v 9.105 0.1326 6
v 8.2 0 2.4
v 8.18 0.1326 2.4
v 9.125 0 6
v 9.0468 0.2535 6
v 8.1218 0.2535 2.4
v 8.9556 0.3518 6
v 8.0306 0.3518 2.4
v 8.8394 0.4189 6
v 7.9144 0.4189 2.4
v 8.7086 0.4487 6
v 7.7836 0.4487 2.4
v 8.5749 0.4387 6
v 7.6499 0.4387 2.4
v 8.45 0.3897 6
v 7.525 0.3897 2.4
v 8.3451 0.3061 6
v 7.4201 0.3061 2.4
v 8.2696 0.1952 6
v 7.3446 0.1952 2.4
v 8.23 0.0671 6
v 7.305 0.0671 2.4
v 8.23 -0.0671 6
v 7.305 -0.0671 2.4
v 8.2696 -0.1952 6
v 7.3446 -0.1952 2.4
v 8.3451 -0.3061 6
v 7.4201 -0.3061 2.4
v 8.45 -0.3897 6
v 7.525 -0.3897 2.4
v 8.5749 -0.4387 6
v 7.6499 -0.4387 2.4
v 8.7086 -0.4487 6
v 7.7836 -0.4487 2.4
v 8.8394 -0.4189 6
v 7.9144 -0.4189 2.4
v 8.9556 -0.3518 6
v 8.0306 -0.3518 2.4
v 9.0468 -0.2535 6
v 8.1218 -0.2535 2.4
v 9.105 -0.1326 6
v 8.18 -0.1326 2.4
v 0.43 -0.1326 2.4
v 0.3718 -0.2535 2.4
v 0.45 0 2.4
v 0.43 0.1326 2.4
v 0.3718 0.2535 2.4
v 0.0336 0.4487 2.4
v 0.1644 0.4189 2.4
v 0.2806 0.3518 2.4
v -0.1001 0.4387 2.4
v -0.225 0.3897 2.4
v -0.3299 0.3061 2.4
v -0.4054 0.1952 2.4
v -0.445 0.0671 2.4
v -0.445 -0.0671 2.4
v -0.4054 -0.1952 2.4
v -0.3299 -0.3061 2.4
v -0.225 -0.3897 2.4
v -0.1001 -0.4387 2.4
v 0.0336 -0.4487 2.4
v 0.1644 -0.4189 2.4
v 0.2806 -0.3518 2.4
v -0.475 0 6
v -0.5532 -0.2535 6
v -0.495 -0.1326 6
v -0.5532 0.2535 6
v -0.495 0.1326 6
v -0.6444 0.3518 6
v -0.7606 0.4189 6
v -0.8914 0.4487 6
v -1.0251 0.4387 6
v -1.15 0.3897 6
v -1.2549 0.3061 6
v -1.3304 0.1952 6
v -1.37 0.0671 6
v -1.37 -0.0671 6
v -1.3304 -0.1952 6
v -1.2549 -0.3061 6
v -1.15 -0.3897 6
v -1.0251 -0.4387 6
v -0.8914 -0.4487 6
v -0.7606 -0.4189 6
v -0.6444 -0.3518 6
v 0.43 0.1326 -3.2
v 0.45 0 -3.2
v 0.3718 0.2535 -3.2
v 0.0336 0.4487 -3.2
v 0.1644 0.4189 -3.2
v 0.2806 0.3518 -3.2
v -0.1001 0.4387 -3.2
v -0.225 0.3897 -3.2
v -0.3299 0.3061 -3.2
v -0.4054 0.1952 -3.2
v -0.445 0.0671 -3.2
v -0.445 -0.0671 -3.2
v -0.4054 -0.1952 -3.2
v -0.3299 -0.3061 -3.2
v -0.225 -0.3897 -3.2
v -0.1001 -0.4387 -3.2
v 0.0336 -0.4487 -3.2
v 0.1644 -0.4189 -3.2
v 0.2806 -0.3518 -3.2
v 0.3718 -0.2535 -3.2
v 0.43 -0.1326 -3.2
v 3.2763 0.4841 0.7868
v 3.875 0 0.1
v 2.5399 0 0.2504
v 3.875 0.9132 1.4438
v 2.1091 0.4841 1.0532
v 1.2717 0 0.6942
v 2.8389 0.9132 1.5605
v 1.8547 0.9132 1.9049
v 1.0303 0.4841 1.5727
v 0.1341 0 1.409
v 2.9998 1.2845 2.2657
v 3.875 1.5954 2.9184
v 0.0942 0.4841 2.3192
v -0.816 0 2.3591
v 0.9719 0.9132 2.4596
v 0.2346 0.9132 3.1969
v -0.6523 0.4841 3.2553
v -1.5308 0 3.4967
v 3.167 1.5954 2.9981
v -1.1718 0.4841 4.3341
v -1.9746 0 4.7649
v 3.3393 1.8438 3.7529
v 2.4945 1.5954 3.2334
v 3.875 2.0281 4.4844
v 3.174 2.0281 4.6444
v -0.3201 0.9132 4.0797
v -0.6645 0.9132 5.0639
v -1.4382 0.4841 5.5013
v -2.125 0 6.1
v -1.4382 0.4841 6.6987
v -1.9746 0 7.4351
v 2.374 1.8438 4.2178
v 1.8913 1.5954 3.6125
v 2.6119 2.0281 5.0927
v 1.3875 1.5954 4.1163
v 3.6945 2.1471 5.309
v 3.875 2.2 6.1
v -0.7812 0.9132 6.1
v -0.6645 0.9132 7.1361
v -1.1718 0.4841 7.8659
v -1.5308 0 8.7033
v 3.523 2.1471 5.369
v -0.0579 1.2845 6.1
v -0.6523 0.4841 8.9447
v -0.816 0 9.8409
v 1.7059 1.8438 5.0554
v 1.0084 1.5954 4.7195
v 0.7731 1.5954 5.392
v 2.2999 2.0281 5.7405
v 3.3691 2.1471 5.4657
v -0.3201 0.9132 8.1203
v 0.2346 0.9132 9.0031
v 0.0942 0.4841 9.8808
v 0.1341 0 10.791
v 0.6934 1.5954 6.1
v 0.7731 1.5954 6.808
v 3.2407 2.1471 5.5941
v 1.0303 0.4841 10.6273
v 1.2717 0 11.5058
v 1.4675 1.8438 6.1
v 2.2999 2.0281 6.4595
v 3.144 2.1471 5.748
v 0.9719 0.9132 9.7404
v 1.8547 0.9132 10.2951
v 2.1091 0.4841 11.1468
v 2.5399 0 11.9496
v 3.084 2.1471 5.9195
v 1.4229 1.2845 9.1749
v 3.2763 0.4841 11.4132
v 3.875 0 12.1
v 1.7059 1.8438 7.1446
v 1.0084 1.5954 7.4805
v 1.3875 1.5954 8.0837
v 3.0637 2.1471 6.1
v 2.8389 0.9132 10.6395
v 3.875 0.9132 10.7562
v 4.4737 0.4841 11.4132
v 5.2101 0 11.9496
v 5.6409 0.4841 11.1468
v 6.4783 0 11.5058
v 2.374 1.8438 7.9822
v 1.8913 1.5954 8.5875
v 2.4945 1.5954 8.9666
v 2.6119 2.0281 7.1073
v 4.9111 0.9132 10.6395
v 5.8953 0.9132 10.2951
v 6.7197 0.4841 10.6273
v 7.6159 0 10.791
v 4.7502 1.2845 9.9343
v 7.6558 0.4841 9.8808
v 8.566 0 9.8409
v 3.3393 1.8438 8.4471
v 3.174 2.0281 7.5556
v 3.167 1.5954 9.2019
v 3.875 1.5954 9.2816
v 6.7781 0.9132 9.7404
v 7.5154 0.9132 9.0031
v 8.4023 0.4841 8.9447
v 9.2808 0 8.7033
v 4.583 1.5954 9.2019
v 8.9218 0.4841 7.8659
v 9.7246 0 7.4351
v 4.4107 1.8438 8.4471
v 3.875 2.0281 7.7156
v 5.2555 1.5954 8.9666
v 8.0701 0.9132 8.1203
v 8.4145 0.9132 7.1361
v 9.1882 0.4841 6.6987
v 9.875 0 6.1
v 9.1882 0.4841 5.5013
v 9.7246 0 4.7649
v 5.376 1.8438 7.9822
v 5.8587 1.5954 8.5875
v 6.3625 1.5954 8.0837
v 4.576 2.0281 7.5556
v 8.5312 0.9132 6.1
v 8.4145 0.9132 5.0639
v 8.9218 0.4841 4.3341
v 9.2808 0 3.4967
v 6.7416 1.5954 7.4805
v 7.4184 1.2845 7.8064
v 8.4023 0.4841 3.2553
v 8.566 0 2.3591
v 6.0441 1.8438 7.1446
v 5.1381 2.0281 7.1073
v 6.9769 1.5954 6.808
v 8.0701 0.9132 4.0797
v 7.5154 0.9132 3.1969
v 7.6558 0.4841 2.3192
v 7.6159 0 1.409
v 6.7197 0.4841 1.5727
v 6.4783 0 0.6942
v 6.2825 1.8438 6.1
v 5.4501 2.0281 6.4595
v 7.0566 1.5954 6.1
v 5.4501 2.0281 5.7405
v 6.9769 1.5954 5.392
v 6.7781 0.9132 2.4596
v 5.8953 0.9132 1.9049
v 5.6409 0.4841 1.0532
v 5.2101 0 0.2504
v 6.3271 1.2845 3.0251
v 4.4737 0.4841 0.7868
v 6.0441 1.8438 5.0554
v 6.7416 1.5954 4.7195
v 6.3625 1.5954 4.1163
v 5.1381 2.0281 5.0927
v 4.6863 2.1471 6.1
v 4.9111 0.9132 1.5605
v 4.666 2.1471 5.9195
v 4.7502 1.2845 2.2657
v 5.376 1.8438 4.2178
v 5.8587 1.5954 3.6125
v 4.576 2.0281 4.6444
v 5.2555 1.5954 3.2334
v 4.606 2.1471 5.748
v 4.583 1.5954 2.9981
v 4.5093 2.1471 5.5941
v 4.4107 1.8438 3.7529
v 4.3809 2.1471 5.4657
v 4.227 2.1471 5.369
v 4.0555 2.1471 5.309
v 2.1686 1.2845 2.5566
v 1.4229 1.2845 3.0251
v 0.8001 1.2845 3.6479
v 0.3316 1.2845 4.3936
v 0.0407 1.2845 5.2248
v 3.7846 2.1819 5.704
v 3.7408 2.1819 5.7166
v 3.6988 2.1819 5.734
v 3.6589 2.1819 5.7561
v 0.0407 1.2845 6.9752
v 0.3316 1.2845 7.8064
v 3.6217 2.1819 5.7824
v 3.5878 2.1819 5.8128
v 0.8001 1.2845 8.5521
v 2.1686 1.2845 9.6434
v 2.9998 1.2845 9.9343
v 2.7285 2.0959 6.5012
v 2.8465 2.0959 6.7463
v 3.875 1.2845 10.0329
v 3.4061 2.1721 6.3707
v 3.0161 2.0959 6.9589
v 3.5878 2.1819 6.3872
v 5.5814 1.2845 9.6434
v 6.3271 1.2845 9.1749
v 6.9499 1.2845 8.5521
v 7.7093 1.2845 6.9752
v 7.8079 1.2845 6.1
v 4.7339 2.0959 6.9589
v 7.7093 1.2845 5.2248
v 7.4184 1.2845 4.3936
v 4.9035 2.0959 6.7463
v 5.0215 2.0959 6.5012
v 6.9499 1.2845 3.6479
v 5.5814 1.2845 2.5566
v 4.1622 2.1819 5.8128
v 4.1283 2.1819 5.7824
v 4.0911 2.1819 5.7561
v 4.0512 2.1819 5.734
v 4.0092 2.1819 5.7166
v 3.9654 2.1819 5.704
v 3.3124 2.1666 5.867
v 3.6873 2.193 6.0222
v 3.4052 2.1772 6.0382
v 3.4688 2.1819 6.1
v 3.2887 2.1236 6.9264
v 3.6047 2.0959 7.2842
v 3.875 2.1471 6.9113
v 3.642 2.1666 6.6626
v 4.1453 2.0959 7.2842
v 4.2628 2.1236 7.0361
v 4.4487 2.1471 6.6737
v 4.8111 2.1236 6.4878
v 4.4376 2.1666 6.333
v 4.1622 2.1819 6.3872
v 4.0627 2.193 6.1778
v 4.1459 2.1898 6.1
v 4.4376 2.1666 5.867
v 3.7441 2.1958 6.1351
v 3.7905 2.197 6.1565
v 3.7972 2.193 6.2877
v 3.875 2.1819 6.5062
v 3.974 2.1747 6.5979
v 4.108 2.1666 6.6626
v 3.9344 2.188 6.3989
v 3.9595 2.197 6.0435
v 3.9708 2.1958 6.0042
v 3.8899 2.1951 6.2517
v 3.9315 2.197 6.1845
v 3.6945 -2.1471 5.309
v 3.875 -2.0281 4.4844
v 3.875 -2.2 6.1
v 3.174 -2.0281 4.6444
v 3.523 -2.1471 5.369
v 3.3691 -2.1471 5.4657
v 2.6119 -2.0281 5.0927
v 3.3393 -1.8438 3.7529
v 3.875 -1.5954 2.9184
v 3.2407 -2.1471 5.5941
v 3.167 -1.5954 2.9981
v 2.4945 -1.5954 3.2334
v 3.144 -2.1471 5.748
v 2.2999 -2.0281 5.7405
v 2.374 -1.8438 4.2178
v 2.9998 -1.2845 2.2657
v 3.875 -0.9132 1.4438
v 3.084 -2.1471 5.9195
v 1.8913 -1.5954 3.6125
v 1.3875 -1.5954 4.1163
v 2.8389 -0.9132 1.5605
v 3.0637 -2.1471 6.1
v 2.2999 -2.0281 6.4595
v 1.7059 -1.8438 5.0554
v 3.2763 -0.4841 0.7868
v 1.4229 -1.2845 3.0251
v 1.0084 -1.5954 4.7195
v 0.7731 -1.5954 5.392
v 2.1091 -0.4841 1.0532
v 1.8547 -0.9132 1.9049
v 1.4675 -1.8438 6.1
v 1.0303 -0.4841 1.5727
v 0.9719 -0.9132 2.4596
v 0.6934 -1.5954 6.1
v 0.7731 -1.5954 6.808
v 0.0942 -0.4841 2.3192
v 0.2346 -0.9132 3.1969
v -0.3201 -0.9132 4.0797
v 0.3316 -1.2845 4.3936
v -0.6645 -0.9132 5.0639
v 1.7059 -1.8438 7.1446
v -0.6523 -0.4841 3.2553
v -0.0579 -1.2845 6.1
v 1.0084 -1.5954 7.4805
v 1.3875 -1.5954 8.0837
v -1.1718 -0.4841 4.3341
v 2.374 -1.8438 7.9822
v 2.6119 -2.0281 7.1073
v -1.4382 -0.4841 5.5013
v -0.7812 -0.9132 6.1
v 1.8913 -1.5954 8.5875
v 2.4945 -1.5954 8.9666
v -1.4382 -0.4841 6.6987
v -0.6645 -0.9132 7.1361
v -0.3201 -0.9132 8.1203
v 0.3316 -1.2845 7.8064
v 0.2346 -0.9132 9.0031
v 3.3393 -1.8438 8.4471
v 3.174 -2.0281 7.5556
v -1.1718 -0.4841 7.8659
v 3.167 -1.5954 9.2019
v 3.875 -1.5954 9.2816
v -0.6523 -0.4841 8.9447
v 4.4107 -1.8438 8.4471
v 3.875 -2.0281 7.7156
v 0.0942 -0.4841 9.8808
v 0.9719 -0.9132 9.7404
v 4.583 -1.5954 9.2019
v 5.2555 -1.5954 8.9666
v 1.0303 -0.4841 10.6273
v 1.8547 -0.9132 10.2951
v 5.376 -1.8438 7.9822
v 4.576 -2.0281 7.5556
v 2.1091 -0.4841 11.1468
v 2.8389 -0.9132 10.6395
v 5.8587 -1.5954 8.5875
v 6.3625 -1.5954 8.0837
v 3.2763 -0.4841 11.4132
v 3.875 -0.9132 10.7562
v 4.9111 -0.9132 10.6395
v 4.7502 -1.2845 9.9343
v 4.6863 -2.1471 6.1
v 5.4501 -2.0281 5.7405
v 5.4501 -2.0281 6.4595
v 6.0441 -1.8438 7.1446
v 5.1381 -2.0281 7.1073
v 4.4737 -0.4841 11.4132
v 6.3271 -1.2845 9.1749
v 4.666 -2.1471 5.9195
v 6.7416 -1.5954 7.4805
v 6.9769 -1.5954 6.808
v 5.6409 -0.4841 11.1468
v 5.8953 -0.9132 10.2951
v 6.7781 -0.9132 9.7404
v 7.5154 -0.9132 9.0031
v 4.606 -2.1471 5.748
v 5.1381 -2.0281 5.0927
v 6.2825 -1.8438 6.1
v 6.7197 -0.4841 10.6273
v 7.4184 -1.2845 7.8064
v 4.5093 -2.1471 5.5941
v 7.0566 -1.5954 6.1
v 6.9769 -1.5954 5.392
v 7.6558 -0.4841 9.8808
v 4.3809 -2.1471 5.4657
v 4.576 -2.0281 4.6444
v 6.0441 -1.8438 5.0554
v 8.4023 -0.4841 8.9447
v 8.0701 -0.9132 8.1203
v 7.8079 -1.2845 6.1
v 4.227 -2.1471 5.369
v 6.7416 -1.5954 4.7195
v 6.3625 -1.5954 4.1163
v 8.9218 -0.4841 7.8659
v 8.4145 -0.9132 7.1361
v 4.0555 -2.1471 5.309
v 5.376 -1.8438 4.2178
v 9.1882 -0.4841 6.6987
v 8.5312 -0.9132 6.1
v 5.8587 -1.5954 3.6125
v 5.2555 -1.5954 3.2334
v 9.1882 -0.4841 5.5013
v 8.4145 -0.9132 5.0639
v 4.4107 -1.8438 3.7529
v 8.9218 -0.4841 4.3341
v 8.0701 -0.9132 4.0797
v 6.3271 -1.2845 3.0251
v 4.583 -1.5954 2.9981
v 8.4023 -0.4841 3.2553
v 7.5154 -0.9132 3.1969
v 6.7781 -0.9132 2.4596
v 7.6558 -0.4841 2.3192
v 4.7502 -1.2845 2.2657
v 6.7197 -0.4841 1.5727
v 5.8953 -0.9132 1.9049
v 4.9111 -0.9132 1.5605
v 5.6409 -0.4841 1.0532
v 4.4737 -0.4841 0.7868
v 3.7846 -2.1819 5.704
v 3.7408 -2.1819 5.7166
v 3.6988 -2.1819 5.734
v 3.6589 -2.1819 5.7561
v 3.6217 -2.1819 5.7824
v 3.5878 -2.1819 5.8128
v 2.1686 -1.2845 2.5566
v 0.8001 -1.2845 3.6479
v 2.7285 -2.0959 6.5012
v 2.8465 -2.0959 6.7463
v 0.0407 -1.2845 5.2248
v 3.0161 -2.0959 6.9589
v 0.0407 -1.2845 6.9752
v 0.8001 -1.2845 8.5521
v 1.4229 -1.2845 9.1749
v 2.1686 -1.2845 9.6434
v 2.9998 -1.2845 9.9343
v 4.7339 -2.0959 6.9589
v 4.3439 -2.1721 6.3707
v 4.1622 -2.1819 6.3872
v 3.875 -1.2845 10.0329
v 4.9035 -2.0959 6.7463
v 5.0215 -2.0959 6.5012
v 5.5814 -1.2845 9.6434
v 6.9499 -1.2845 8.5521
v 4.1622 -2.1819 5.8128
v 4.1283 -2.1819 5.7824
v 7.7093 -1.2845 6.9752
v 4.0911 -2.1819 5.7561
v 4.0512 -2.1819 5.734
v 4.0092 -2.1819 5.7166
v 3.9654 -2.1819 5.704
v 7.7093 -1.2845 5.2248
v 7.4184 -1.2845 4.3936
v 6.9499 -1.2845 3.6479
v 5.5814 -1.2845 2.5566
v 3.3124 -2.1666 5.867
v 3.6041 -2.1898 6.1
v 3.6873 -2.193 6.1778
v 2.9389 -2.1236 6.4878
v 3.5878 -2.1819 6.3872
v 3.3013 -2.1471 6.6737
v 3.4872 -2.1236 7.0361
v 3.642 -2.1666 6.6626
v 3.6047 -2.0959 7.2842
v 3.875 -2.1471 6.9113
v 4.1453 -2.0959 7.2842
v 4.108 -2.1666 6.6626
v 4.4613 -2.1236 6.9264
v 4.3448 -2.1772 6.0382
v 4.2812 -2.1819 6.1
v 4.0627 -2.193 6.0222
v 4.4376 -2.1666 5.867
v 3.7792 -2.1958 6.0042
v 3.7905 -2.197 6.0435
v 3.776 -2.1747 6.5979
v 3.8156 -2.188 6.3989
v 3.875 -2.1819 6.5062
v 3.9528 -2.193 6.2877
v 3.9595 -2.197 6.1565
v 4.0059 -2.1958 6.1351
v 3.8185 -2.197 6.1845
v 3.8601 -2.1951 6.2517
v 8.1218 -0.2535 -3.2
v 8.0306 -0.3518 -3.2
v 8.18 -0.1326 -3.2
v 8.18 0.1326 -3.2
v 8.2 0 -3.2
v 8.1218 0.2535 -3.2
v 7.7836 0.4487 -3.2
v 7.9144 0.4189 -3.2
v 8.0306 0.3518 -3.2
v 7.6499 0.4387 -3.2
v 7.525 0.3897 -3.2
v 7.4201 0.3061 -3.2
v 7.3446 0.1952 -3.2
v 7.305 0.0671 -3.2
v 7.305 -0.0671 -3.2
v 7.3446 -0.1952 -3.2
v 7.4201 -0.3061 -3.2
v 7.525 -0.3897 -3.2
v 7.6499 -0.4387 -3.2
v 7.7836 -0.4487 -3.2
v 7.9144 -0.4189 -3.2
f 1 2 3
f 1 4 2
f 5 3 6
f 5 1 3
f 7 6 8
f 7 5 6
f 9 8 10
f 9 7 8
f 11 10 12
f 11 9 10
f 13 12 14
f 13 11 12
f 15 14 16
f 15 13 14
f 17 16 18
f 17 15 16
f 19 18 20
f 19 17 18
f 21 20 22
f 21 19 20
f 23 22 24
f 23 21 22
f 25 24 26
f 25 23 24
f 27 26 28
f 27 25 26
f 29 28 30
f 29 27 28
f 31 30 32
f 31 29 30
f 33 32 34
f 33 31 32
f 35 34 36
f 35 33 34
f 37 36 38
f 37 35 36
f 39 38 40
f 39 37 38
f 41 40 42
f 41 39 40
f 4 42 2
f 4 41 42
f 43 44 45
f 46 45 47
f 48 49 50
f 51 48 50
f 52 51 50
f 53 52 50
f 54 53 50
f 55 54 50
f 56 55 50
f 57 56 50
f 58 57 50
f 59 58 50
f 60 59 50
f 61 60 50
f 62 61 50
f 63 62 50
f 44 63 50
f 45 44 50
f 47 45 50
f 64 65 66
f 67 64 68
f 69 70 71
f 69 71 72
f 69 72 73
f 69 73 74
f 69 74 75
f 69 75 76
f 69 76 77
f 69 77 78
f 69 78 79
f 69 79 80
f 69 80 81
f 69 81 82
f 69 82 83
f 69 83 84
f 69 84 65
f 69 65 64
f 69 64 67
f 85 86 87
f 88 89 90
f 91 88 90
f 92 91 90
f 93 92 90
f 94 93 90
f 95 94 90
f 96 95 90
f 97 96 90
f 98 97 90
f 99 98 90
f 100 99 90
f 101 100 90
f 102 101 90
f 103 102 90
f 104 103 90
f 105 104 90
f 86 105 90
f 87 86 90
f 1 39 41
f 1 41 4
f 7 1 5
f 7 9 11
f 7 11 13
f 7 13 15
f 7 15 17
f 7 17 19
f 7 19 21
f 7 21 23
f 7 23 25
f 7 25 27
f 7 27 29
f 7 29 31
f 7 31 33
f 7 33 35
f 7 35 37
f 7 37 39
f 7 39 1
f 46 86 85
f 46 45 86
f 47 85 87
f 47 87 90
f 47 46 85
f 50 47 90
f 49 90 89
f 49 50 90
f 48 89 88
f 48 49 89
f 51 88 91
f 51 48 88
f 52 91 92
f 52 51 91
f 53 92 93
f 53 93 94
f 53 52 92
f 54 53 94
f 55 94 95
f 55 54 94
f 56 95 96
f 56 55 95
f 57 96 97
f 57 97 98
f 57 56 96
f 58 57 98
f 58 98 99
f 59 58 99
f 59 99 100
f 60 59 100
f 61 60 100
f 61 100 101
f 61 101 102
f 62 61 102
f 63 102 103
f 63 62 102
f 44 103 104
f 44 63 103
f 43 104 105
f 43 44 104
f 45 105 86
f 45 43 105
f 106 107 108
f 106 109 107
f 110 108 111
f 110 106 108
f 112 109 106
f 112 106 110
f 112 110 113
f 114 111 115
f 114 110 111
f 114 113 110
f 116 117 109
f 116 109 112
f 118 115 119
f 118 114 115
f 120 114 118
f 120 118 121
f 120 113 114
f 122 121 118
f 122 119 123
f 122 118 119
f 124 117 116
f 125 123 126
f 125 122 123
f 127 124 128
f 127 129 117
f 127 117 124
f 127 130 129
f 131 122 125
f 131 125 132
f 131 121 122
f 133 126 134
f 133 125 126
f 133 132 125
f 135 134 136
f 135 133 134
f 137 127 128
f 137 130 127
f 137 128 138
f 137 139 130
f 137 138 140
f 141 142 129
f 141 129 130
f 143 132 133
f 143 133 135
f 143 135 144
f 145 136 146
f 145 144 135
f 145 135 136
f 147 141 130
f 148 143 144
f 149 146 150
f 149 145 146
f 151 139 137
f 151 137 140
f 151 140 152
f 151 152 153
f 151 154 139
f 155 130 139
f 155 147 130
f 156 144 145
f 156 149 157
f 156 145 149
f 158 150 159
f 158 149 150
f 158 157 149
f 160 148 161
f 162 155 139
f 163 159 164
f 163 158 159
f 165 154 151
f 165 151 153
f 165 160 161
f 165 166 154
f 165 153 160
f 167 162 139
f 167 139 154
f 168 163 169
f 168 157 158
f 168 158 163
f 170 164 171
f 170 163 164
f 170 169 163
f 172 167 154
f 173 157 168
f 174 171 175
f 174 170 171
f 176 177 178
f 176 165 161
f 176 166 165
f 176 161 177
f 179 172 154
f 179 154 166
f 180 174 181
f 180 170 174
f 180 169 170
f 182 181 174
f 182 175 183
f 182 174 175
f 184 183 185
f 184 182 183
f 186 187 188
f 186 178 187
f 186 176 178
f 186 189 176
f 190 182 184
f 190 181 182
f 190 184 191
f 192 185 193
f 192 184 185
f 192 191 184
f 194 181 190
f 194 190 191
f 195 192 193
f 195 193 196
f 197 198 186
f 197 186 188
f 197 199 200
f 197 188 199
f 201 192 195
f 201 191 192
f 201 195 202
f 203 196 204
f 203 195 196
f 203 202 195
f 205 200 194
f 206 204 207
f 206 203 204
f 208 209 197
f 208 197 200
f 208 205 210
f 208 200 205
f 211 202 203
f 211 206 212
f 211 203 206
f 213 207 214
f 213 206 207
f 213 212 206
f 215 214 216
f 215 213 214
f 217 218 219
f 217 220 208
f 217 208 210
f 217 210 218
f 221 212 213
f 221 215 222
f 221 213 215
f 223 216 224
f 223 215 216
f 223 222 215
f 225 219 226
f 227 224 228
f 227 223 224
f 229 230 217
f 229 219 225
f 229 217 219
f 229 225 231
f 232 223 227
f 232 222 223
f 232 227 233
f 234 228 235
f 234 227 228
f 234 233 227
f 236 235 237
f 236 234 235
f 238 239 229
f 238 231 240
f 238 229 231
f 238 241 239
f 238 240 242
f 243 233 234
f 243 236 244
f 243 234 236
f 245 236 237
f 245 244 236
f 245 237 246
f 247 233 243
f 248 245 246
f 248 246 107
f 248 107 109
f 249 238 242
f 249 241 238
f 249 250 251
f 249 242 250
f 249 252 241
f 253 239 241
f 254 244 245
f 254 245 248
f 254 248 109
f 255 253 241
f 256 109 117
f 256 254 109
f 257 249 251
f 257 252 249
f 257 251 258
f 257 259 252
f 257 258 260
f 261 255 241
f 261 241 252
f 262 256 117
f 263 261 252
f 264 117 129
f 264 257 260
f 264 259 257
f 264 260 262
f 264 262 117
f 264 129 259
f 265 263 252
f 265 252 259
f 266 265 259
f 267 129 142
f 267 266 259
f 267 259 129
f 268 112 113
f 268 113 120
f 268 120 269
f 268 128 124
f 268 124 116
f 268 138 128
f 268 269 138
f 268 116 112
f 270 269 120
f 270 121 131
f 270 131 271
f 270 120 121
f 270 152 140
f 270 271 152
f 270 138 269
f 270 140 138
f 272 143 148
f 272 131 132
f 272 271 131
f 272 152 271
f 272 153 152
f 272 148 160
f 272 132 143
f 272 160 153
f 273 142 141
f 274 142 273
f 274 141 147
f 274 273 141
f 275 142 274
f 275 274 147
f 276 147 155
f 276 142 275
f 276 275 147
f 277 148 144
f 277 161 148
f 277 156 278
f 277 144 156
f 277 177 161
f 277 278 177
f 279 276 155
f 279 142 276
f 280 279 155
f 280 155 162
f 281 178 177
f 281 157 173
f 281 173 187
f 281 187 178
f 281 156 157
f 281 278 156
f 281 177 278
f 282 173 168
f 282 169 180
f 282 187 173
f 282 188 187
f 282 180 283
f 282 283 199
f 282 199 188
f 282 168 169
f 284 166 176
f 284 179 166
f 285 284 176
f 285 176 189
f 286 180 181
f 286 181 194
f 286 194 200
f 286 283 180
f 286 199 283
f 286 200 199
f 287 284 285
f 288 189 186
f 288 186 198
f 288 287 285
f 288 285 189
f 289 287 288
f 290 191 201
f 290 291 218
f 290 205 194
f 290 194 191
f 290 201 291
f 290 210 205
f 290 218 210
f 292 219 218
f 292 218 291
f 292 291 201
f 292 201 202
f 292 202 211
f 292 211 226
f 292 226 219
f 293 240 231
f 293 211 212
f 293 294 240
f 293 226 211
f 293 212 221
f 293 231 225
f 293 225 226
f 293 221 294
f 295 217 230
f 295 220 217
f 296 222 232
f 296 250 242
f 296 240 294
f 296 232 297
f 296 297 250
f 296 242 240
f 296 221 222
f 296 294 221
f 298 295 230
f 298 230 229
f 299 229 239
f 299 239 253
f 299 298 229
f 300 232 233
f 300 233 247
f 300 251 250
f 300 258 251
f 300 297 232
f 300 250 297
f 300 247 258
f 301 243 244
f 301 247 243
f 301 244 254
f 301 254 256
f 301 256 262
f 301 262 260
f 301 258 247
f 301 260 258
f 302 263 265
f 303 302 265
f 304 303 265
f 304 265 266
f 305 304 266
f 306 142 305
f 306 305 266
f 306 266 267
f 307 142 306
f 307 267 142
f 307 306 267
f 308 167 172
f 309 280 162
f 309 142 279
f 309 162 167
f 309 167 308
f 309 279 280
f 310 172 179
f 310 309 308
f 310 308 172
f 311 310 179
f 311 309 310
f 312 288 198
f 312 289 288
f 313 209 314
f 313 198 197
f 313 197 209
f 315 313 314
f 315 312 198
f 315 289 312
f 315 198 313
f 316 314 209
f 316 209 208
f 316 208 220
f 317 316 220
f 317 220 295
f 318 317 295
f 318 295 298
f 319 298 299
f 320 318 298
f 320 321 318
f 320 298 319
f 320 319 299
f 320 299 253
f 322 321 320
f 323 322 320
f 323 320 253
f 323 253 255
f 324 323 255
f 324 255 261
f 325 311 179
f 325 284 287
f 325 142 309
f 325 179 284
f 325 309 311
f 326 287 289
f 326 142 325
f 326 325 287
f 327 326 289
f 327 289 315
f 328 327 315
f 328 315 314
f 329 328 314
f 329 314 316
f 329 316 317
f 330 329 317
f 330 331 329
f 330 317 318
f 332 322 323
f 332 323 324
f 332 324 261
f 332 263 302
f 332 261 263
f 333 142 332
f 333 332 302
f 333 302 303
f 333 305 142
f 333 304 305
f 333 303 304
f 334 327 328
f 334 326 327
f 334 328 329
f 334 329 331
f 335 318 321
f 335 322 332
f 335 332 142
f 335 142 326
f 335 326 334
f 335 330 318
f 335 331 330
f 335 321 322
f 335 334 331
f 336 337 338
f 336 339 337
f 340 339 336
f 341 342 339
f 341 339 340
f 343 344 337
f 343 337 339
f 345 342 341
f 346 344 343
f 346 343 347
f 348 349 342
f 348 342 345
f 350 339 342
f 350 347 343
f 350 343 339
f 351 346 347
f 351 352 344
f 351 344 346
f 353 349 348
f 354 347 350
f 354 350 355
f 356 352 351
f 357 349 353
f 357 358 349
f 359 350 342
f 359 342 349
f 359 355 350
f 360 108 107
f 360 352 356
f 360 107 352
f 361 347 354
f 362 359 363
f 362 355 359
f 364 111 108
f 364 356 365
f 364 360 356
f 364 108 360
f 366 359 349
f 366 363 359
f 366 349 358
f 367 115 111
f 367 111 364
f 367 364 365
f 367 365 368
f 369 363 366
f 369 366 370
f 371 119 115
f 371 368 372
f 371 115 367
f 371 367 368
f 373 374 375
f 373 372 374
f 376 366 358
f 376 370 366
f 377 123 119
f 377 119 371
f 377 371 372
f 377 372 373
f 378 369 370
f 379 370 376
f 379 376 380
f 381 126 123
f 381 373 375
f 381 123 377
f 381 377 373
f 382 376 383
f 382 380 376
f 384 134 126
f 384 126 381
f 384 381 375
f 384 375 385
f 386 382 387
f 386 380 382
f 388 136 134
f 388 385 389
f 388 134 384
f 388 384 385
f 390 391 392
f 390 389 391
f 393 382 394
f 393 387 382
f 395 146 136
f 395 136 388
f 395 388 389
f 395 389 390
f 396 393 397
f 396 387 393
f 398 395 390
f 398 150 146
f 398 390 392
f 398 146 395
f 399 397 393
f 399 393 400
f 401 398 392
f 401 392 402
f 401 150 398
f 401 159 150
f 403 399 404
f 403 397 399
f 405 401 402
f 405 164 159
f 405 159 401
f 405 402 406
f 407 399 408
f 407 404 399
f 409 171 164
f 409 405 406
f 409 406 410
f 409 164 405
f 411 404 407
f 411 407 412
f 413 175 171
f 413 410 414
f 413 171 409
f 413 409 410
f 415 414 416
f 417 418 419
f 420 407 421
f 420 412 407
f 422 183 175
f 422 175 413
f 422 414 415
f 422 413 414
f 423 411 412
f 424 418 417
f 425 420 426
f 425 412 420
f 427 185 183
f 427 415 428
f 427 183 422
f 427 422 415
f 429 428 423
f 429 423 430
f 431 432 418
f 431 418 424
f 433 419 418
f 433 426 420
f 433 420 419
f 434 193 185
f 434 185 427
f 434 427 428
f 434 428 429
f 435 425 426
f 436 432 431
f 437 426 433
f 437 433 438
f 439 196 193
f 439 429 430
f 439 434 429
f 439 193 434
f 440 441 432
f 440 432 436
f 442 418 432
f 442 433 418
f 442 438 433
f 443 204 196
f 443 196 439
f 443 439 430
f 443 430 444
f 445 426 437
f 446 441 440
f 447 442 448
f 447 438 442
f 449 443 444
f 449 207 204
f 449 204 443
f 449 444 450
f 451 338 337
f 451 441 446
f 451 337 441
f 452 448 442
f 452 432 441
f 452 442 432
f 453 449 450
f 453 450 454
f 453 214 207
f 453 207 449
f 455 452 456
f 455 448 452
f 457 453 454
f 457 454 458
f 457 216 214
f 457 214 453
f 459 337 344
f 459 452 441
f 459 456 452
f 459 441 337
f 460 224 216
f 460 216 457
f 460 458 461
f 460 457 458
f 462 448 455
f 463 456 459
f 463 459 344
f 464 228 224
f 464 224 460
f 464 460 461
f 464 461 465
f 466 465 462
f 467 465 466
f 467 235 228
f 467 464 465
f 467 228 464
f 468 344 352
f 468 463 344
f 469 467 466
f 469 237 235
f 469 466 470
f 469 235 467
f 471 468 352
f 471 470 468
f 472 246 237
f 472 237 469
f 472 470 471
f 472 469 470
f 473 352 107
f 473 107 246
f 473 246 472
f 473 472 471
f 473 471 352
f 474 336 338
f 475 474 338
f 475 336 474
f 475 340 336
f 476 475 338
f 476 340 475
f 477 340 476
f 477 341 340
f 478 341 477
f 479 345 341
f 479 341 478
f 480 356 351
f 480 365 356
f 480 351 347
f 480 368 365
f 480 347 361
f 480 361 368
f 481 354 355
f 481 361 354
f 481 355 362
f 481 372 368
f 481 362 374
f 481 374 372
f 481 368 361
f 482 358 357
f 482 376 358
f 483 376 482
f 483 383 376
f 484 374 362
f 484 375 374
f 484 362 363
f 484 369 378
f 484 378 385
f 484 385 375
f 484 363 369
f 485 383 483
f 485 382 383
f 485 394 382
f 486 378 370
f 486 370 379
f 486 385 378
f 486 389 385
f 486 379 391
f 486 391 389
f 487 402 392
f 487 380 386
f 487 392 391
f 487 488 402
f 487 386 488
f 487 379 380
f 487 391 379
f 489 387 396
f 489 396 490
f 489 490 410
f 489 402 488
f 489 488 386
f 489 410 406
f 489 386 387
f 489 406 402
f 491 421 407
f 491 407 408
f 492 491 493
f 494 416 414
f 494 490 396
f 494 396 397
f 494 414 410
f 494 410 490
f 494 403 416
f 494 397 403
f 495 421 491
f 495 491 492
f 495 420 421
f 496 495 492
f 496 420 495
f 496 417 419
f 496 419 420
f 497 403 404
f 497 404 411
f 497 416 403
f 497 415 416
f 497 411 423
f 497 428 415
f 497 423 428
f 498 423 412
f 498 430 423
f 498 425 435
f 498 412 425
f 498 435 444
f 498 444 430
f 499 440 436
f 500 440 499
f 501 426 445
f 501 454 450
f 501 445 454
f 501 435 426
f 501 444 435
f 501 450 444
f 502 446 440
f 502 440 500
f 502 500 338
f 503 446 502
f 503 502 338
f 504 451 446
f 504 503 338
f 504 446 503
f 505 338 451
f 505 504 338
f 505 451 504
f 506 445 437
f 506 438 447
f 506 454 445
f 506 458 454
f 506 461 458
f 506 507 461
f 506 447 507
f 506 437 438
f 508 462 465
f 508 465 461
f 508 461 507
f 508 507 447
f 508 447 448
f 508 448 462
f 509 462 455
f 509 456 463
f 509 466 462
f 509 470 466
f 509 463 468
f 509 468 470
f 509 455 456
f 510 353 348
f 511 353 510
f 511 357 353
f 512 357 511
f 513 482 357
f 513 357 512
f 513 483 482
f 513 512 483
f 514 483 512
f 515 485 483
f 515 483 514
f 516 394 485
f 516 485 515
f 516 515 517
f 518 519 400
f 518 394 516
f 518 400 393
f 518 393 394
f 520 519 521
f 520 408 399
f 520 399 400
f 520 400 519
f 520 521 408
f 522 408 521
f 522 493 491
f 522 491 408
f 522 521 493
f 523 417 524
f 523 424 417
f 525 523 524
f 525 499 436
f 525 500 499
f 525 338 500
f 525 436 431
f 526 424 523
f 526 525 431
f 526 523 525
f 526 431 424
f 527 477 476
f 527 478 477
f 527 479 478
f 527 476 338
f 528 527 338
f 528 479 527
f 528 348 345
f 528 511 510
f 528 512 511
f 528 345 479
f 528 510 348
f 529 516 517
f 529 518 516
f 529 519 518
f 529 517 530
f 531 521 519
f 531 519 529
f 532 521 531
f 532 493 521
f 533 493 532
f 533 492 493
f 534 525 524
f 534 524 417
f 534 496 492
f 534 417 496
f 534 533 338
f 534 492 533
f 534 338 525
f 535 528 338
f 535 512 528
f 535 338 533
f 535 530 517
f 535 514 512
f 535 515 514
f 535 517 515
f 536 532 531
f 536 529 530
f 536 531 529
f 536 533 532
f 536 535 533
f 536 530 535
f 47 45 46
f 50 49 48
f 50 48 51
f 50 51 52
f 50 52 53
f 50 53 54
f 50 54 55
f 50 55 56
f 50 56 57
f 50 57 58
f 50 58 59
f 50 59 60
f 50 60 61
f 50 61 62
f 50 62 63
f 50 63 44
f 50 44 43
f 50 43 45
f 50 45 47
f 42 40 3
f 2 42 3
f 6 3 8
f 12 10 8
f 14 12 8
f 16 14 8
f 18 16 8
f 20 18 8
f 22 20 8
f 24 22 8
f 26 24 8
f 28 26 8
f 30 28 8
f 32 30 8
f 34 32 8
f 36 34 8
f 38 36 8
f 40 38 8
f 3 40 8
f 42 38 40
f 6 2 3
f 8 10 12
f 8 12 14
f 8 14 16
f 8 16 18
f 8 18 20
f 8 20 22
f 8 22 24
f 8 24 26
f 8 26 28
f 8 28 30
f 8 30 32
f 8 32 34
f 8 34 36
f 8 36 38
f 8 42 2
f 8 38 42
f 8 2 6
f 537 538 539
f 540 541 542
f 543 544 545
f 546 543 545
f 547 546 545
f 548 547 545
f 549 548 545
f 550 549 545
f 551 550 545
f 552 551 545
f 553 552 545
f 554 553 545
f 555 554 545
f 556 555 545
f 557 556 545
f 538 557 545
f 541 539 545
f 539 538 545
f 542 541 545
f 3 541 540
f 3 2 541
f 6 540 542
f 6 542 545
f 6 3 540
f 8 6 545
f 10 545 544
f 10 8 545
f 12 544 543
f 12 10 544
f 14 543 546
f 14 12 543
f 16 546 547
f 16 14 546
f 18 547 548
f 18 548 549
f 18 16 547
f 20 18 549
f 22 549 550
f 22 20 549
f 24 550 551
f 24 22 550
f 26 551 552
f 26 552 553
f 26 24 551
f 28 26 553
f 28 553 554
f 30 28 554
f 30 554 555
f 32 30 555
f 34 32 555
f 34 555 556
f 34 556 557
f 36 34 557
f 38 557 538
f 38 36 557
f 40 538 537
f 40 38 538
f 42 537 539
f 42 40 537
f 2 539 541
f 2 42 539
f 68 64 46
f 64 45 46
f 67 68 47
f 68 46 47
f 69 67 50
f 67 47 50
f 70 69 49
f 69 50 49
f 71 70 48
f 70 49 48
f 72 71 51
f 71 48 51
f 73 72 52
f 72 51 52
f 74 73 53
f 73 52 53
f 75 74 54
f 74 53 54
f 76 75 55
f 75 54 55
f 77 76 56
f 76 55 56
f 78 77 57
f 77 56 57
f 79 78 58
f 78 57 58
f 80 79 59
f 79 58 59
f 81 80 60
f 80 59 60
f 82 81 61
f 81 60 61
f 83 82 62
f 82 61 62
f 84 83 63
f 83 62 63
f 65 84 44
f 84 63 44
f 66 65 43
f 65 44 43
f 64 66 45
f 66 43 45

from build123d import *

# Parameters (mm, degrees)
SKETCH001_R       = 0.45
PAD001_DEPTH      = 2.4
PAD001_DEPTH_BACK = 3.2
SKETCH002_R       = 0.45
SKETCH003_R       = 0.45
SKETCH004_R       = 0.45
SKETCH005_R       = 0.45


with BuildPart() as pad001:
    # Sketch001 → Pad001 (new body, two sides)
    with BuildSketch(Plane.XY) as pad001_sk:
        Circle(SKETCH001_R)
        with Locations((7.75, 0)):
            Circle(SKETCH001_R)
    extrude(amount=PAD001_DEPTH)
    extrude(pad001_sk.sketch, amount=-PAD001_DEPTH_BACK)


with BuildPart() as revolution:
    # Sketch → Revolution (revolve)
    with BuildSketch(Plane.YZ.offset(3.875)):
        with BuildLine():
            Line((-2.2, 6.1), (2.2, 6.1))
            ThreePointArc((0, 0.1), (1.595374, 2.918363), (2.2, 6.1))
            ThreePointArc((-2.2, 6.1), (-1.595374, 2.918363), (0, 0.1))
        make_face()
    revolve(axis=Axis((3.875, -3.32079, 6.1), (0, 1, 0)))


with BuildPart() as loft_body:
    # Sketch002 → Loft section 0
    with BuildSketch(Plane.XY.offset(6)):
        with Locations((-0.925, 0)):
            Circle(SKETCH002_R)
    # Sketch003 → Loft section 1
    with BuildSketch(Plane.XY.offset(2.4)):
        Circle(SKETCH003_R)
    loft()


with BuildPart() as loft001:
    # Sketch004 → Loft001 section 0
    with BuildSketch(Plane.XY.offset(2.4)):
        with Locations((7.75, 0)):
            Circle(SKETCH004_R)
    # Sketch005 → Loft001 section 1
    with BuildSketch(Plane.XY.offset(6)):
        with Locations((8.675, 0)):
            Circle(SKETCH005_R)
    loft()


solid = Compound([pad001.part, revolution.part, loft_body.part, loft001.part])
